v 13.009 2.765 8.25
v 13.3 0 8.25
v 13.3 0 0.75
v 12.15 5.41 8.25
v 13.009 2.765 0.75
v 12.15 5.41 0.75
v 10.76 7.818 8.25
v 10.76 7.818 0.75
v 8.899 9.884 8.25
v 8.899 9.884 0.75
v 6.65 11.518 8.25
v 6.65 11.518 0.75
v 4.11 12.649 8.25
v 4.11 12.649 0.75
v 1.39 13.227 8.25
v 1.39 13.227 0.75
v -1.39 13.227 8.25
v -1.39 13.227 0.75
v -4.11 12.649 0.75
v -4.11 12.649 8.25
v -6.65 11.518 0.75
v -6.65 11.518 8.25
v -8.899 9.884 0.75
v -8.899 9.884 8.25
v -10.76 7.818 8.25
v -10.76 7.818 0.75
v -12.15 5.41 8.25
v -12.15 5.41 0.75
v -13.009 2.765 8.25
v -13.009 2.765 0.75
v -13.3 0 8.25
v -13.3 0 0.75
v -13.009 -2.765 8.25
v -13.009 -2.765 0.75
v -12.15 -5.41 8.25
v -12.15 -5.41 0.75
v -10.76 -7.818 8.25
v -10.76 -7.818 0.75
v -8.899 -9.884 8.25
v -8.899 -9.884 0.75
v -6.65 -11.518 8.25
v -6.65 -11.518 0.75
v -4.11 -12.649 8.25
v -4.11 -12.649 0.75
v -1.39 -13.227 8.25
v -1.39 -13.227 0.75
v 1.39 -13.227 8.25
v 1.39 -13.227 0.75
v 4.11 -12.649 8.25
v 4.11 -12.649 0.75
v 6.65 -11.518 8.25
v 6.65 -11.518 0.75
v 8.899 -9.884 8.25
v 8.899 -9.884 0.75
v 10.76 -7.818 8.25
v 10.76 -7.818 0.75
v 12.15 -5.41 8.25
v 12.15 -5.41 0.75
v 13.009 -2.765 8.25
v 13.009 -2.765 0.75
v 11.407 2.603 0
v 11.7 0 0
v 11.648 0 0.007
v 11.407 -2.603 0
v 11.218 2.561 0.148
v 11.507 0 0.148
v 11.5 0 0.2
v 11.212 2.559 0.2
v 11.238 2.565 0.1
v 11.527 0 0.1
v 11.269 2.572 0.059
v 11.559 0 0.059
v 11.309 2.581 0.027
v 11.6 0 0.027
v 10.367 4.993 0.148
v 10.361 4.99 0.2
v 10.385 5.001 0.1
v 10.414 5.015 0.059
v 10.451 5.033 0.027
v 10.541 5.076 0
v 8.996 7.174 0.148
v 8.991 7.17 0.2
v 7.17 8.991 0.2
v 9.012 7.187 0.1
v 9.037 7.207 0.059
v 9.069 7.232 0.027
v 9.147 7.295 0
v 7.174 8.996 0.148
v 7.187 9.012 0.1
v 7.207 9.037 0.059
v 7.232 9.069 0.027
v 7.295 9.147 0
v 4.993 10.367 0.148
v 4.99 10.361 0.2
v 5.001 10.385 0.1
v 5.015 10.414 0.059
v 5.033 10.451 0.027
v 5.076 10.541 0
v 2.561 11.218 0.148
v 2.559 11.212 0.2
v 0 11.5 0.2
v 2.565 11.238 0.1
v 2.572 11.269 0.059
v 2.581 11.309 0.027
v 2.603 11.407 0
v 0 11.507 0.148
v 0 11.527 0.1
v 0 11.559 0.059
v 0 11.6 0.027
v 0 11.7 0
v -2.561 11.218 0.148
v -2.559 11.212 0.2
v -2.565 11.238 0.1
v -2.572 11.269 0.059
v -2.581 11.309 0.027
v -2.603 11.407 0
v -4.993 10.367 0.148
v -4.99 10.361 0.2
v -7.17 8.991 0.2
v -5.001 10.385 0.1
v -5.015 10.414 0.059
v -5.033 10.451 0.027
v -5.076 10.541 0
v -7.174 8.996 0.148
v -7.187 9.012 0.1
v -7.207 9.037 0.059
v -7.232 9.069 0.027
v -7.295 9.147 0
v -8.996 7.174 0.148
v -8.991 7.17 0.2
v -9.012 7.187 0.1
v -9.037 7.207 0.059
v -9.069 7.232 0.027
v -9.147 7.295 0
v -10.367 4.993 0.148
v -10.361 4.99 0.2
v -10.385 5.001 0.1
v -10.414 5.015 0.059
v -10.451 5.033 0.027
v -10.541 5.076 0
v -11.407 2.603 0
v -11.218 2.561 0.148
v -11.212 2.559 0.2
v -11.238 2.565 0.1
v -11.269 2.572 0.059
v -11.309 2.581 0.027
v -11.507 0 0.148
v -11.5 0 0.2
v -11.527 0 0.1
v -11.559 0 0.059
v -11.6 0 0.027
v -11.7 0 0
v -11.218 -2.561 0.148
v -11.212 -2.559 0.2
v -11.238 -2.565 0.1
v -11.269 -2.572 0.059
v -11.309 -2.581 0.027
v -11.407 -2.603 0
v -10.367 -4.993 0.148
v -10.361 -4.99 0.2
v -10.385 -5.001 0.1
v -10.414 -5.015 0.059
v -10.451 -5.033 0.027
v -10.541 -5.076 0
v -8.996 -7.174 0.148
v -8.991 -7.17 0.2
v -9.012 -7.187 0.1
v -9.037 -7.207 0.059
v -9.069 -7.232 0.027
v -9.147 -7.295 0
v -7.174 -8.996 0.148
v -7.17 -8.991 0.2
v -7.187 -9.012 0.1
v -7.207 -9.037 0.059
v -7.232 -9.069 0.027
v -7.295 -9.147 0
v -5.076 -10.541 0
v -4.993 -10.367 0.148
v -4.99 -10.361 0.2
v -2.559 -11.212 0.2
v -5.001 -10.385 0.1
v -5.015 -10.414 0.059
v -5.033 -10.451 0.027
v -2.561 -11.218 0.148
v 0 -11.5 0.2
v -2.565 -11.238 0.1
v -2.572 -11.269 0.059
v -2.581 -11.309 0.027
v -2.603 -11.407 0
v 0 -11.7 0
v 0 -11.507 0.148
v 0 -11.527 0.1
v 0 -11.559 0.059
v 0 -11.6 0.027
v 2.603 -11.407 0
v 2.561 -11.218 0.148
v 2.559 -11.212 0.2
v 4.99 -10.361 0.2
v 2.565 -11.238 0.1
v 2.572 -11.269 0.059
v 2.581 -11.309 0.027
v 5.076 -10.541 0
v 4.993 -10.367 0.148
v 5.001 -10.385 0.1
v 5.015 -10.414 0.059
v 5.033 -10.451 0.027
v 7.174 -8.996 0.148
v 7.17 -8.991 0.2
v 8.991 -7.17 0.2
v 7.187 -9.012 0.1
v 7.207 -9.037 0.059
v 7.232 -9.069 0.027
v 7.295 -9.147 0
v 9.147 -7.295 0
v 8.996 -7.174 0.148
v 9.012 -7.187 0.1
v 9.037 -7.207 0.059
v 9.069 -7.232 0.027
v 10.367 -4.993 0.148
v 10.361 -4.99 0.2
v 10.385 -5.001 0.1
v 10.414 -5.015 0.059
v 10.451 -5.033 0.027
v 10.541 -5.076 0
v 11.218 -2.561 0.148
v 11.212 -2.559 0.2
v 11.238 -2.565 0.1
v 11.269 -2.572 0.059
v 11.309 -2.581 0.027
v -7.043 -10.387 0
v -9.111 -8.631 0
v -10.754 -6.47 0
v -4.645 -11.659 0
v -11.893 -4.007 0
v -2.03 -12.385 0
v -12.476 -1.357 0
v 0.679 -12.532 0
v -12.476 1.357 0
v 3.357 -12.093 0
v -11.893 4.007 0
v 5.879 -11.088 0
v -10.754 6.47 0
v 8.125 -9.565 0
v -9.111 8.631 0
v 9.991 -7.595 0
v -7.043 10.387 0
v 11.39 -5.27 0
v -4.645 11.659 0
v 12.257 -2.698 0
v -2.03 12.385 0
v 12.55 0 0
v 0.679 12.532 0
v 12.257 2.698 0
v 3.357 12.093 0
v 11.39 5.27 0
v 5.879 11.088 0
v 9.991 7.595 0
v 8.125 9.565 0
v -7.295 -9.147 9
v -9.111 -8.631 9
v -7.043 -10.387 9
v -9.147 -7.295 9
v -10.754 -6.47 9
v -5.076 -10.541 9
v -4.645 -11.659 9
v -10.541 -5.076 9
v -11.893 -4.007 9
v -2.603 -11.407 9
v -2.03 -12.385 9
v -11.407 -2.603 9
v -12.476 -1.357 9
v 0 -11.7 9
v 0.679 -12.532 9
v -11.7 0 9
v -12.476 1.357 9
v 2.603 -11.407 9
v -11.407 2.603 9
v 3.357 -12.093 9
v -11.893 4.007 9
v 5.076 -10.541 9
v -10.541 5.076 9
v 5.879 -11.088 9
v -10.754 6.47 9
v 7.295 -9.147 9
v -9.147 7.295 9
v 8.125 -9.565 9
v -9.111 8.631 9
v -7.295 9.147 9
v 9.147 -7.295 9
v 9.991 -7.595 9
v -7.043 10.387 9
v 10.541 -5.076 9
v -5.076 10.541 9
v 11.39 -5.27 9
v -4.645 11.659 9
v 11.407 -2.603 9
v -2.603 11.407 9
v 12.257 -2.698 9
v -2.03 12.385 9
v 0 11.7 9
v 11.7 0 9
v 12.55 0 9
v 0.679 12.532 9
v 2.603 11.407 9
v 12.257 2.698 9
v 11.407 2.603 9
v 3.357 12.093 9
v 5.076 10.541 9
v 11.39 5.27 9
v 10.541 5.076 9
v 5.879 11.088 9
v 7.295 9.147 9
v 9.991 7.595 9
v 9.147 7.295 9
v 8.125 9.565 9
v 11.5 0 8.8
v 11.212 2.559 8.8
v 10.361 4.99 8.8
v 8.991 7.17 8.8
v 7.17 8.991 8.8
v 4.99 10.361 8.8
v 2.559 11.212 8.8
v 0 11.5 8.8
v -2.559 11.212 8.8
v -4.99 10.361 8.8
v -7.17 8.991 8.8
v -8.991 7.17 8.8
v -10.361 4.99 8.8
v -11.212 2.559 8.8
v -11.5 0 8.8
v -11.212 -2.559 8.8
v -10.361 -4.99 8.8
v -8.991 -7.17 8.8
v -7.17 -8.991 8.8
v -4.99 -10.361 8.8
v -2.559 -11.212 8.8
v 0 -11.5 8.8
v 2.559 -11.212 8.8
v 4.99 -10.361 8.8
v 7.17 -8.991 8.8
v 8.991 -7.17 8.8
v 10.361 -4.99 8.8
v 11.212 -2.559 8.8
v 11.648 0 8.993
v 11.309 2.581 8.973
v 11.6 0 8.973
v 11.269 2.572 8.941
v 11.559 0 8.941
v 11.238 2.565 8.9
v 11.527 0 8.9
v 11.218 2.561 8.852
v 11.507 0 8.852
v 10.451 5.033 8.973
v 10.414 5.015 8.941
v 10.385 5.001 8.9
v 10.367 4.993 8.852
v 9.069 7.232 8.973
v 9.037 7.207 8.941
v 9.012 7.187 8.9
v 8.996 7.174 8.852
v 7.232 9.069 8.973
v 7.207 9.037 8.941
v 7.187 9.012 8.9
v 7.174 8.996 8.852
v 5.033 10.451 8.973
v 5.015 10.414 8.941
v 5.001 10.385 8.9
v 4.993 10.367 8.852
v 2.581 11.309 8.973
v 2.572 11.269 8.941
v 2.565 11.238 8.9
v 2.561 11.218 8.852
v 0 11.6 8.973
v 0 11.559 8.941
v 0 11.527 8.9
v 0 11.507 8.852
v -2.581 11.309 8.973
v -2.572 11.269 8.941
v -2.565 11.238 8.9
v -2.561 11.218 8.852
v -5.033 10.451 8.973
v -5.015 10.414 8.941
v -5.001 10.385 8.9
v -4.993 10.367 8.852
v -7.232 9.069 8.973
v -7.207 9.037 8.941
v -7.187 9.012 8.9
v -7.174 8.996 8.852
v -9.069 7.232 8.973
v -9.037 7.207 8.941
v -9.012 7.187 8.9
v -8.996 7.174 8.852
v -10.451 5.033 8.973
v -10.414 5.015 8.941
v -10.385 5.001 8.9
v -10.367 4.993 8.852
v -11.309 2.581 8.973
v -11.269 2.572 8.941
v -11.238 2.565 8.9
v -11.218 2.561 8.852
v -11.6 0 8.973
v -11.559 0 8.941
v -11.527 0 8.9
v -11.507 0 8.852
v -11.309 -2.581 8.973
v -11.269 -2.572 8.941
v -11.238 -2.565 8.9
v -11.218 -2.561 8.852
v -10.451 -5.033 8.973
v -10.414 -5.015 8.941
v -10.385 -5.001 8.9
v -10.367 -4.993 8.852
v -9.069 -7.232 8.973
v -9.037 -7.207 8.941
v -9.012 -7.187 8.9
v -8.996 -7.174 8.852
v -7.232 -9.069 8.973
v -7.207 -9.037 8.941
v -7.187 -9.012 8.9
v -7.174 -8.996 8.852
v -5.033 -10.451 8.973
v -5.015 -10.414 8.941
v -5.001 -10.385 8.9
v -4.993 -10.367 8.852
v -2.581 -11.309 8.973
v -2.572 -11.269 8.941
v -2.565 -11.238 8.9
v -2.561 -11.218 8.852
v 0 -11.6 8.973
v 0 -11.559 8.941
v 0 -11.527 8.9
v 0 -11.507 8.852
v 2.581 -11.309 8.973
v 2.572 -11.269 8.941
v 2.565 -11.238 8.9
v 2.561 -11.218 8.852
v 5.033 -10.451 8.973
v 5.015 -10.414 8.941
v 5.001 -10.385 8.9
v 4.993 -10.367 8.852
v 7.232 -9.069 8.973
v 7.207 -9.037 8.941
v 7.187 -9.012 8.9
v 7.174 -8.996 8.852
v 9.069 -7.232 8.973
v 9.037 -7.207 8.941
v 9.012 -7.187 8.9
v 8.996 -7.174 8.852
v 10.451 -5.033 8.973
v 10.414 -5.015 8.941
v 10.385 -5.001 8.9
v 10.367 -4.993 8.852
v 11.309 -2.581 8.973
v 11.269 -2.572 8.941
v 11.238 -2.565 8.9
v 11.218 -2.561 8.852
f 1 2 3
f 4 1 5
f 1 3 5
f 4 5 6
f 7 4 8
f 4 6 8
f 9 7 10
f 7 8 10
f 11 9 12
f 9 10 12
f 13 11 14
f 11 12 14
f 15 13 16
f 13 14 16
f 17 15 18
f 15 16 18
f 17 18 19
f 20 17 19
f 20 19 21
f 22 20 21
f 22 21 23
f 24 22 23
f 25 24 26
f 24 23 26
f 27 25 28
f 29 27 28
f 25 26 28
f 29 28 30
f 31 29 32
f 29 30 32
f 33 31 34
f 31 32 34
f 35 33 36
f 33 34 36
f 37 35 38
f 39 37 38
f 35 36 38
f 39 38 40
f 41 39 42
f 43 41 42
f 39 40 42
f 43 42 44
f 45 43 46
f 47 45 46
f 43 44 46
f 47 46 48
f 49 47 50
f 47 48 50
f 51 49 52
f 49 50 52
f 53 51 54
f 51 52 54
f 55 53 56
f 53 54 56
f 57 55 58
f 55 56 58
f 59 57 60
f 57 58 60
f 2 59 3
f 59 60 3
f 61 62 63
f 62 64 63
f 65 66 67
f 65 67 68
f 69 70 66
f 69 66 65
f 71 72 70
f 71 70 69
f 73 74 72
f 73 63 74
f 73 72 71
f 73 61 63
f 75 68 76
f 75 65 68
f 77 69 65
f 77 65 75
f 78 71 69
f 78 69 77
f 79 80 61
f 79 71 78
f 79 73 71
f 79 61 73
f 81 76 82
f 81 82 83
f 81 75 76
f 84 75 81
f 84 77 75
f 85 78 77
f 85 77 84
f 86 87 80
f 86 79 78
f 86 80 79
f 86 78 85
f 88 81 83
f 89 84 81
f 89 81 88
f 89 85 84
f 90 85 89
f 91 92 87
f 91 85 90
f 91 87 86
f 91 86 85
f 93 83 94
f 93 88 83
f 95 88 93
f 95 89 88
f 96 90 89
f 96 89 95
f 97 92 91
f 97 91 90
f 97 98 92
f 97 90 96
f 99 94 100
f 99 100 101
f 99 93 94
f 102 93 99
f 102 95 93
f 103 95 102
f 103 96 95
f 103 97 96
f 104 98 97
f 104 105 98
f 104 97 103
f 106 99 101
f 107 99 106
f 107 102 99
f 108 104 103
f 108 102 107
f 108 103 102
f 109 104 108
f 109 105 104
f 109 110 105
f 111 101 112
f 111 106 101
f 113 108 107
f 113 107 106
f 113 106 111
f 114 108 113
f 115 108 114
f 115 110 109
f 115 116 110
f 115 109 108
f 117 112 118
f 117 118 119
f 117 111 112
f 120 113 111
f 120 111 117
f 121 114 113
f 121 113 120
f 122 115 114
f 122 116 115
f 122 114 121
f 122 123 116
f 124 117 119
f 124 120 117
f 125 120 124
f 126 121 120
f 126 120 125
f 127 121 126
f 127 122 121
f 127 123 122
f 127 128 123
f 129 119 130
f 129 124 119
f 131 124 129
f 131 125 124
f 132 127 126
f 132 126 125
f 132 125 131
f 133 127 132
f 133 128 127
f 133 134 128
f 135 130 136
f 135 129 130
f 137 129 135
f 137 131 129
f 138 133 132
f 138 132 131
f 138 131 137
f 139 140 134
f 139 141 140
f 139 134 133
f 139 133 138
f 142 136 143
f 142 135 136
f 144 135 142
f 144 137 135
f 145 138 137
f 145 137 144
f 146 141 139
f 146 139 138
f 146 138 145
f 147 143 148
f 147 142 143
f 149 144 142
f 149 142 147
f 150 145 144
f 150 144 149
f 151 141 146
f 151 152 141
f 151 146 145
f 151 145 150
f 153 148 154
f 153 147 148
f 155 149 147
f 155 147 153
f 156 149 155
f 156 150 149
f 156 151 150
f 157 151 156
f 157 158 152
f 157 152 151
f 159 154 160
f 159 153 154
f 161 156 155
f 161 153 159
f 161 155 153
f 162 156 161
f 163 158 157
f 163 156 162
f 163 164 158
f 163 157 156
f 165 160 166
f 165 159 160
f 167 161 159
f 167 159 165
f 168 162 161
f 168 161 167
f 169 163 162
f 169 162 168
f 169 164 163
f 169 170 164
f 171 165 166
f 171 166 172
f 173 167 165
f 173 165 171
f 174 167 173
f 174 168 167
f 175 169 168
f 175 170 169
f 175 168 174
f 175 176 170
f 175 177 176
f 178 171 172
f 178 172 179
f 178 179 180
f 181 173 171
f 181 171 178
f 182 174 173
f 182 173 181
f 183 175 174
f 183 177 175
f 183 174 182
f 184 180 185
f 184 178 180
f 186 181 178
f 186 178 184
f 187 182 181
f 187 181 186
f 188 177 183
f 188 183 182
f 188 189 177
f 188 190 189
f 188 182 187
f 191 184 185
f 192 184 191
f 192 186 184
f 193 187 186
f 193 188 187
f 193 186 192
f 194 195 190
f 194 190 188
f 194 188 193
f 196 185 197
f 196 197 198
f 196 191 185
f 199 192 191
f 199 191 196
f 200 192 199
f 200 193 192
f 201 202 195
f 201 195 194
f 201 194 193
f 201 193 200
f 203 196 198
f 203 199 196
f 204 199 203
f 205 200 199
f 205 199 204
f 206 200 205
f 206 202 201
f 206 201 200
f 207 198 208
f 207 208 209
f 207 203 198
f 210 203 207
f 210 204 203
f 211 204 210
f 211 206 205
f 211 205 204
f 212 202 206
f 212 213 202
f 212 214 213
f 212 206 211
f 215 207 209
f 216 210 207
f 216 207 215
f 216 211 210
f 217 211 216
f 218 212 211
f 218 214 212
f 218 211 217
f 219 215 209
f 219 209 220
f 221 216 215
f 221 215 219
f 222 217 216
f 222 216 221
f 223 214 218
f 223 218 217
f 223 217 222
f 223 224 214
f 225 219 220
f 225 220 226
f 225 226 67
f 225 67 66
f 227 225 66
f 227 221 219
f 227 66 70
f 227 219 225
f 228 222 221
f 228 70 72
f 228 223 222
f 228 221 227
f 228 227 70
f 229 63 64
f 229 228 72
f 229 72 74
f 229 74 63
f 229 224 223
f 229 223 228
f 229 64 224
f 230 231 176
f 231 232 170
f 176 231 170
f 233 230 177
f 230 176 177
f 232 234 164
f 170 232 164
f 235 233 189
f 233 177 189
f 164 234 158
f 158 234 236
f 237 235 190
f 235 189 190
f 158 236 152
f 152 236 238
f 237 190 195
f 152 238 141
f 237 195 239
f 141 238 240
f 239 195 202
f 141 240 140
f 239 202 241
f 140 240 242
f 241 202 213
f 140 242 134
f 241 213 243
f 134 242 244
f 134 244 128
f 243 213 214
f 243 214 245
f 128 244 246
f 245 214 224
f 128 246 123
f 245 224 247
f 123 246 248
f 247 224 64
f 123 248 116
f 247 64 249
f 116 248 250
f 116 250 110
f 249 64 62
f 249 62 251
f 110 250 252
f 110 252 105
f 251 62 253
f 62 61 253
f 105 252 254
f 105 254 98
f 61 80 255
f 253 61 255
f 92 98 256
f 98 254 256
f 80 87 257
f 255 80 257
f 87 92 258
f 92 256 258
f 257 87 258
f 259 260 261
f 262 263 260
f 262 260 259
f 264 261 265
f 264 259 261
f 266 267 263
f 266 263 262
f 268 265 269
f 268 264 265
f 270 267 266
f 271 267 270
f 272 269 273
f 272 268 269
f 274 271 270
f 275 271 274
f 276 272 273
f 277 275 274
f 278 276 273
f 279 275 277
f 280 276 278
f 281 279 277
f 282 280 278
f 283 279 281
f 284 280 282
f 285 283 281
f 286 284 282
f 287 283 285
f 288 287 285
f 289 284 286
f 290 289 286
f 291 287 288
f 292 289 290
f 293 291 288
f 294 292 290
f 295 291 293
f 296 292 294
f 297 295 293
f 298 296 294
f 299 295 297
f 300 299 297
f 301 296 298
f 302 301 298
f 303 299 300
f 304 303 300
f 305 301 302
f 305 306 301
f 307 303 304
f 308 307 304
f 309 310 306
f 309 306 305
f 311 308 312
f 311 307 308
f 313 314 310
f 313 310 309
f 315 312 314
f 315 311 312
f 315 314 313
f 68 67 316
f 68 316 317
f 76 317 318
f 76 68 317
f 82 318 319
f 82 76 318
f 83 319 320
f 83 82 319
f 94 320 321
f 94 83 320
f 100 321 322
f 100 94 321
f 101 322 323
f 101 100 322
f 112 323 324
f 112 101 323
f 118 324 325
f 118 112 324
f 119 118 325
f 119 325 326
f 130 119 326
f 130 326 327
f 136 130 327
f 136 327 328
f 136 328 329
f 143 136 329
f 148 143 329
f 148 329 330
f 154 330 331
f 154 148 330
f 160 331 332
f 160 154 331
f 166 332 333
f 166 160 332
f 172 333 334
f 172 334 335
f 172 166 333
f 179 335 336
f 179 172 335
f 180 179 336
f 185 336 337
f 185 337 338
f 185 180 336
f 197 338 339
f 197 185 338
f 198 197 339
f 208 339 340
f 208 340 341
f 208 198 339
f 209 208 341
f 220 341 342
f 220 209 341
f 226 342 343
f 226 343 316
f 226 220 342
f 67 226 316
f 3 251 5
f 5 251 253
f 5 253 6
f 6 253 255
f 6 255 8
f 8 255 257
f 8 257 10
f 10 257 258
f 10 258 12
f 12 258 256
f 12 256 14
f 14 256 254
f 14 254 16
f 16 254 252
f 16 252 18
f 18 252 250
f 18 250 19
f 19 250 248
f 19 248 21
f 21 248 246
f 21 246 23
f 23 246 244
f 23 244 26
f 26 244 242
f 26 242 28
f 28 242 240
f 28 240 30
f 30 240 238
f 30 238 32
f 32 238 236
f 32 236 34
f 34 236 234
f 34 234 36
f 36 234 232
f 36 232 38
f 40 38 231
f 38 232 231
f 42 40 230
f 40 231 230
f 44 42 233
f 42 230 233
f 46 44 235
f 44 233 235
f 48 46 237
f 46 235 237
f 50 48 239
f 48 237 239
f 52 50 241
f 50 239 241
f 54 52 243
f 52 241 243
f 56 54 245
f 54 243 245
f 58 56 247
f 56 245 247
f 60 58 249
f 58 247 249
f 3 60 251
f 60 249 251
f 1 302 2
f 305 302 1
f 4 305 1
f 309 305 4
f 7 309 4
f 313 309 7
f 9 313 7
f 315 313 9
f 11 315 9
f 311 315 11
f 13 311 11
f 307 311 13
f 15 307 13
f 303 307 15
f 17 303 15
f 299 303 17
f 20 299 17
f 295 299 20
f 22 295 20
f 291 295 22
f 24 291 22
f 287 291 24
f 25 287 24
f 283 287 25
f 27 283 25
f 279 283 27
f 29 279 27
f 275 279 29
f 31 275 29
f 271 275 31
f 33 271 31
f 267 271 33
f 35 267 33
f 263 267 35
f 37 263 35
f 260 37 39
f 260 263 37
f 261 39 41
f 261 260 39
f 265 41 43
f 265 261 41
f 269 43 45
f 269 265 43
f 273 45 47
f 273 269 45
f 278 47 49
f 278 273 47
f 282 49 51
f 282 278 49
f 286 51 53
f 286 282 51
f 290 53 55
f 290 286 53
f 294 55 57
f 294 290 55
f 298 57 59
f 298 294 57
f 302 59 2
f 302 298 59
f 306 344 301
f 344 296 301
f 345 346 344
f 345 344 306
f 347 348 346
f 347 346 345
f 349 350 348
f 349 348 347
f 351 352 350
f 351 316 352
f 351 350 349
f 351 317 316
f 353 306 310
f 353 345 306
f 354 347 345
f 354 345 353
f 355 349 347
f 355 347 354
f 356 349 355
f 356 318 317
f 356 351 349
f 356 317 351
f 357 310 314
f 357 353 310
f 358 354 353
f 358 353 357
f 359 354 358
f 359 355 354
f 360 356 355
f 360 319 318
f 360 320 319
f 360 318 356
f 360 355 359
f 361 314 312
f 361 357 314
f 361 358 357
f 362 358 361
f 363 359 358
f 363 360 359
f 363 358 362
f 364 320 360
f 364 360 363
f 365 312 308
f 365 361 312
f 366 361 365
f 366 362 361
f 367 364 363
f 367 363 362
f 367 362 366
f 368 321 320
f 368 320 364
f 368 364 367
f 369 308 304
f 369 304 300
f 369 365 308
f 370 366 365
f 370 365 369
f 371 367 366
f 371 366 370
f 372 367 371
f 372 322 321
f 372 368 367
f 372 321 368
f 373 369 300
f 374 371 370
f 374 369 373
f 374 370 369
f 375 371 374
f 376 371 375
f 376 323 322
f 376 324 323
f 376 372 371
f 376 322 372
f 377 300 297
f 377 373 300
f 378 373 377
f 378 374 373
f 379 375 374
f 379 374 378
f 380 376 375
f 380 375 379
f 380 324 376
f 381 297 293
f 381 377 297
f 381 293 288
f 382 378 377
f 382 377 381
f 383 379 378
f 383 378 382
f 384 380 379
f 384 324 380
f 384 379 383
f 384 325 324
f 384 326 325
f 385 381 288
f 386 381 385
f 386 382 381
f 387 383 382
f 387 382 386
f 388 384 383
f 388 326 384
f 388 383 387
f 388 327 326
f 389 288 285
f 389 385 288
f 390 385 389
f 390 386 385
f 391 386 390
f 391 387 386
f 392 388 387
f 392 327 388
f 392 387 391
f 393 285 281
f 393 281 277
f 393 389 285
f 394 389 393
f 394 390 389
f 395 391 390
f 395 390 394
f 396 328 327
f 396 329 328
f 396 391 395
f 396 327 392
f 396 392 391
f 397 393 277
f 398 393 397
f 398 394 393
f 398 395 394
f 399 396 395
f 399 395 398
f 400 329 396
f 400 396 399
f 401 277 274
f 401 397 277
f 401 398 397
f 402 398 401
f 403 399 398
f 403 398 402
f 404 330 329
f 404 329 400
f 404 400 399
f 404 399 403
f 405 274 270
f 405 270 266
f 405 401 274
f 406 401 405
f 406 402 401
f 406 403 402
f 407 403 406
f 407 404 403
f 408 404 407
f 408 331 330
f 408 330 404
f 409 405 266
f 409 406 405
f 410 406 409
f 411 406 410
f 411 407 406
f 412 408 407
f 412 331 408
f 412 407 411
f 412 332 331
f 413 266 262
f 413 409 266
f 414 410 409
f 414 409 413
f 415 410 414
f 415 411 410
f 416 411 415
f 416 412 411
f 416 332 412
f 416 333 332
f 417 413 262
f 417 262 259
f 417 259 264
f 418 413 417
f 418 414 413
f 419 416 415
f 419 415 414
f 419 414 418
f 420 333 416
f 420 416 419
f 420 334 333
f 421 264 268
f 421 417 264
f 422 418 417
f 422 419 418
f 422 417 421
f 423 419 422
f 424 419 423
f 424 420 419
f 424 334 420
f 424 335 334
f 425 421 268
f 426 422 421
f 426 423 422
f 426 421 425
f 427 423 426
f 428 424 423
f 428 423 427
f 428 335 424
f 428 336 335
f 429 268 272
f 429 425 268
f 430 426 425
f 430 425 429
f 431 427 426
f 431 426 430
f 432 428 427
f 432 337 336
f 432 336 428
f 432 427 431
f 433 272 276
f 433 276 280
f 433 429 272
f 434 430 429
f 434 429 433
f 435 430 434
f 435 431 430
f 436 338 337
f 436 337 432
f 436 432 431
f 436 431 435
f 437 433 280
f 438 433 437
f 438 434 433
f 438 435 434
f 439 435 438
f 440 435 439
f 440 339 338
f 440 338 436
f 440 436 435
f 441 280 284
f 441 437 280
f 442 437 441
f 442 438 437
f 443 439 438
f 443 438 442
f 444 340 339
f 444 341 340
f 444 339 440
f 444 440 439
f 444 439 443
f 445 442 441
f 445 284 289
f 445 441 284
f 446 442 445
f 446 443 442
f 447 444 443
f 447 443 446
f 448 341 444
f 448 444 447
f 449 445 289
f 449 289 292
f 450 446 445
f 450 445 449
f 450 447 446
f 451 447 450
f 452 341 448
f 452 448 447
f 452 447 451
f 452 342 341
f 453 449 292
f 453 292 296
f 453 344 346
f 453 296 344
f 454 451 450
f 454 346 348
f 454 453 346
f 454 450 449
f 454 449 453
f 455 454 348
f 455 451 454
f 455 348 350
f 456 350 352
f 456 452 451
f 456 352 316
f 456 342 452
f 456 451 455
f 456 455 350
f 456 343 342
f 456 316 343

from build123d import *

# Parameters (mm, degrees)
F0_R     = 13.3
F0_R_2   = 11.5
F1_DEPTH = 9
F2_SIZE  = 0.75
F3_R     = 0.2
F4_R     = 0.2


with BuildPart() as f1:
    # F0 (on Top) → F1 (new body)
    with BuildSketch(Plane.XY):
        Circle(F0_R)
        Circle(F0_R_2, mode=Mode.SUBTRACT)
    extrude(amount=F1_DEPTH)

    # F2
    f2_edges = [f1.edges().sort_by_distance(p)[0] for p in [
        (-13.3, 0, 9),
        (-13.3, 0, 0),
    ]]
    chamfer(f2_edges, length=F2_SIZE)

    # F3
    f3_edges = [f1.edges().sort_by_distance(p)[0] for p in [
        (-11.5, 0, 9),
    ]]
    fillet(f3_edges, radius=F3_R)

    # F4
    f4_edges = [f1.edges().sort_by_distance(p)[0] for p in [
        (11.5, 0, 4.4),
        (-11.5, 0, 8.8),
        (-11.5, 0, 0),
    ]]
    fillet(f4_edges, radius=F4_R)


solid = f1.part
